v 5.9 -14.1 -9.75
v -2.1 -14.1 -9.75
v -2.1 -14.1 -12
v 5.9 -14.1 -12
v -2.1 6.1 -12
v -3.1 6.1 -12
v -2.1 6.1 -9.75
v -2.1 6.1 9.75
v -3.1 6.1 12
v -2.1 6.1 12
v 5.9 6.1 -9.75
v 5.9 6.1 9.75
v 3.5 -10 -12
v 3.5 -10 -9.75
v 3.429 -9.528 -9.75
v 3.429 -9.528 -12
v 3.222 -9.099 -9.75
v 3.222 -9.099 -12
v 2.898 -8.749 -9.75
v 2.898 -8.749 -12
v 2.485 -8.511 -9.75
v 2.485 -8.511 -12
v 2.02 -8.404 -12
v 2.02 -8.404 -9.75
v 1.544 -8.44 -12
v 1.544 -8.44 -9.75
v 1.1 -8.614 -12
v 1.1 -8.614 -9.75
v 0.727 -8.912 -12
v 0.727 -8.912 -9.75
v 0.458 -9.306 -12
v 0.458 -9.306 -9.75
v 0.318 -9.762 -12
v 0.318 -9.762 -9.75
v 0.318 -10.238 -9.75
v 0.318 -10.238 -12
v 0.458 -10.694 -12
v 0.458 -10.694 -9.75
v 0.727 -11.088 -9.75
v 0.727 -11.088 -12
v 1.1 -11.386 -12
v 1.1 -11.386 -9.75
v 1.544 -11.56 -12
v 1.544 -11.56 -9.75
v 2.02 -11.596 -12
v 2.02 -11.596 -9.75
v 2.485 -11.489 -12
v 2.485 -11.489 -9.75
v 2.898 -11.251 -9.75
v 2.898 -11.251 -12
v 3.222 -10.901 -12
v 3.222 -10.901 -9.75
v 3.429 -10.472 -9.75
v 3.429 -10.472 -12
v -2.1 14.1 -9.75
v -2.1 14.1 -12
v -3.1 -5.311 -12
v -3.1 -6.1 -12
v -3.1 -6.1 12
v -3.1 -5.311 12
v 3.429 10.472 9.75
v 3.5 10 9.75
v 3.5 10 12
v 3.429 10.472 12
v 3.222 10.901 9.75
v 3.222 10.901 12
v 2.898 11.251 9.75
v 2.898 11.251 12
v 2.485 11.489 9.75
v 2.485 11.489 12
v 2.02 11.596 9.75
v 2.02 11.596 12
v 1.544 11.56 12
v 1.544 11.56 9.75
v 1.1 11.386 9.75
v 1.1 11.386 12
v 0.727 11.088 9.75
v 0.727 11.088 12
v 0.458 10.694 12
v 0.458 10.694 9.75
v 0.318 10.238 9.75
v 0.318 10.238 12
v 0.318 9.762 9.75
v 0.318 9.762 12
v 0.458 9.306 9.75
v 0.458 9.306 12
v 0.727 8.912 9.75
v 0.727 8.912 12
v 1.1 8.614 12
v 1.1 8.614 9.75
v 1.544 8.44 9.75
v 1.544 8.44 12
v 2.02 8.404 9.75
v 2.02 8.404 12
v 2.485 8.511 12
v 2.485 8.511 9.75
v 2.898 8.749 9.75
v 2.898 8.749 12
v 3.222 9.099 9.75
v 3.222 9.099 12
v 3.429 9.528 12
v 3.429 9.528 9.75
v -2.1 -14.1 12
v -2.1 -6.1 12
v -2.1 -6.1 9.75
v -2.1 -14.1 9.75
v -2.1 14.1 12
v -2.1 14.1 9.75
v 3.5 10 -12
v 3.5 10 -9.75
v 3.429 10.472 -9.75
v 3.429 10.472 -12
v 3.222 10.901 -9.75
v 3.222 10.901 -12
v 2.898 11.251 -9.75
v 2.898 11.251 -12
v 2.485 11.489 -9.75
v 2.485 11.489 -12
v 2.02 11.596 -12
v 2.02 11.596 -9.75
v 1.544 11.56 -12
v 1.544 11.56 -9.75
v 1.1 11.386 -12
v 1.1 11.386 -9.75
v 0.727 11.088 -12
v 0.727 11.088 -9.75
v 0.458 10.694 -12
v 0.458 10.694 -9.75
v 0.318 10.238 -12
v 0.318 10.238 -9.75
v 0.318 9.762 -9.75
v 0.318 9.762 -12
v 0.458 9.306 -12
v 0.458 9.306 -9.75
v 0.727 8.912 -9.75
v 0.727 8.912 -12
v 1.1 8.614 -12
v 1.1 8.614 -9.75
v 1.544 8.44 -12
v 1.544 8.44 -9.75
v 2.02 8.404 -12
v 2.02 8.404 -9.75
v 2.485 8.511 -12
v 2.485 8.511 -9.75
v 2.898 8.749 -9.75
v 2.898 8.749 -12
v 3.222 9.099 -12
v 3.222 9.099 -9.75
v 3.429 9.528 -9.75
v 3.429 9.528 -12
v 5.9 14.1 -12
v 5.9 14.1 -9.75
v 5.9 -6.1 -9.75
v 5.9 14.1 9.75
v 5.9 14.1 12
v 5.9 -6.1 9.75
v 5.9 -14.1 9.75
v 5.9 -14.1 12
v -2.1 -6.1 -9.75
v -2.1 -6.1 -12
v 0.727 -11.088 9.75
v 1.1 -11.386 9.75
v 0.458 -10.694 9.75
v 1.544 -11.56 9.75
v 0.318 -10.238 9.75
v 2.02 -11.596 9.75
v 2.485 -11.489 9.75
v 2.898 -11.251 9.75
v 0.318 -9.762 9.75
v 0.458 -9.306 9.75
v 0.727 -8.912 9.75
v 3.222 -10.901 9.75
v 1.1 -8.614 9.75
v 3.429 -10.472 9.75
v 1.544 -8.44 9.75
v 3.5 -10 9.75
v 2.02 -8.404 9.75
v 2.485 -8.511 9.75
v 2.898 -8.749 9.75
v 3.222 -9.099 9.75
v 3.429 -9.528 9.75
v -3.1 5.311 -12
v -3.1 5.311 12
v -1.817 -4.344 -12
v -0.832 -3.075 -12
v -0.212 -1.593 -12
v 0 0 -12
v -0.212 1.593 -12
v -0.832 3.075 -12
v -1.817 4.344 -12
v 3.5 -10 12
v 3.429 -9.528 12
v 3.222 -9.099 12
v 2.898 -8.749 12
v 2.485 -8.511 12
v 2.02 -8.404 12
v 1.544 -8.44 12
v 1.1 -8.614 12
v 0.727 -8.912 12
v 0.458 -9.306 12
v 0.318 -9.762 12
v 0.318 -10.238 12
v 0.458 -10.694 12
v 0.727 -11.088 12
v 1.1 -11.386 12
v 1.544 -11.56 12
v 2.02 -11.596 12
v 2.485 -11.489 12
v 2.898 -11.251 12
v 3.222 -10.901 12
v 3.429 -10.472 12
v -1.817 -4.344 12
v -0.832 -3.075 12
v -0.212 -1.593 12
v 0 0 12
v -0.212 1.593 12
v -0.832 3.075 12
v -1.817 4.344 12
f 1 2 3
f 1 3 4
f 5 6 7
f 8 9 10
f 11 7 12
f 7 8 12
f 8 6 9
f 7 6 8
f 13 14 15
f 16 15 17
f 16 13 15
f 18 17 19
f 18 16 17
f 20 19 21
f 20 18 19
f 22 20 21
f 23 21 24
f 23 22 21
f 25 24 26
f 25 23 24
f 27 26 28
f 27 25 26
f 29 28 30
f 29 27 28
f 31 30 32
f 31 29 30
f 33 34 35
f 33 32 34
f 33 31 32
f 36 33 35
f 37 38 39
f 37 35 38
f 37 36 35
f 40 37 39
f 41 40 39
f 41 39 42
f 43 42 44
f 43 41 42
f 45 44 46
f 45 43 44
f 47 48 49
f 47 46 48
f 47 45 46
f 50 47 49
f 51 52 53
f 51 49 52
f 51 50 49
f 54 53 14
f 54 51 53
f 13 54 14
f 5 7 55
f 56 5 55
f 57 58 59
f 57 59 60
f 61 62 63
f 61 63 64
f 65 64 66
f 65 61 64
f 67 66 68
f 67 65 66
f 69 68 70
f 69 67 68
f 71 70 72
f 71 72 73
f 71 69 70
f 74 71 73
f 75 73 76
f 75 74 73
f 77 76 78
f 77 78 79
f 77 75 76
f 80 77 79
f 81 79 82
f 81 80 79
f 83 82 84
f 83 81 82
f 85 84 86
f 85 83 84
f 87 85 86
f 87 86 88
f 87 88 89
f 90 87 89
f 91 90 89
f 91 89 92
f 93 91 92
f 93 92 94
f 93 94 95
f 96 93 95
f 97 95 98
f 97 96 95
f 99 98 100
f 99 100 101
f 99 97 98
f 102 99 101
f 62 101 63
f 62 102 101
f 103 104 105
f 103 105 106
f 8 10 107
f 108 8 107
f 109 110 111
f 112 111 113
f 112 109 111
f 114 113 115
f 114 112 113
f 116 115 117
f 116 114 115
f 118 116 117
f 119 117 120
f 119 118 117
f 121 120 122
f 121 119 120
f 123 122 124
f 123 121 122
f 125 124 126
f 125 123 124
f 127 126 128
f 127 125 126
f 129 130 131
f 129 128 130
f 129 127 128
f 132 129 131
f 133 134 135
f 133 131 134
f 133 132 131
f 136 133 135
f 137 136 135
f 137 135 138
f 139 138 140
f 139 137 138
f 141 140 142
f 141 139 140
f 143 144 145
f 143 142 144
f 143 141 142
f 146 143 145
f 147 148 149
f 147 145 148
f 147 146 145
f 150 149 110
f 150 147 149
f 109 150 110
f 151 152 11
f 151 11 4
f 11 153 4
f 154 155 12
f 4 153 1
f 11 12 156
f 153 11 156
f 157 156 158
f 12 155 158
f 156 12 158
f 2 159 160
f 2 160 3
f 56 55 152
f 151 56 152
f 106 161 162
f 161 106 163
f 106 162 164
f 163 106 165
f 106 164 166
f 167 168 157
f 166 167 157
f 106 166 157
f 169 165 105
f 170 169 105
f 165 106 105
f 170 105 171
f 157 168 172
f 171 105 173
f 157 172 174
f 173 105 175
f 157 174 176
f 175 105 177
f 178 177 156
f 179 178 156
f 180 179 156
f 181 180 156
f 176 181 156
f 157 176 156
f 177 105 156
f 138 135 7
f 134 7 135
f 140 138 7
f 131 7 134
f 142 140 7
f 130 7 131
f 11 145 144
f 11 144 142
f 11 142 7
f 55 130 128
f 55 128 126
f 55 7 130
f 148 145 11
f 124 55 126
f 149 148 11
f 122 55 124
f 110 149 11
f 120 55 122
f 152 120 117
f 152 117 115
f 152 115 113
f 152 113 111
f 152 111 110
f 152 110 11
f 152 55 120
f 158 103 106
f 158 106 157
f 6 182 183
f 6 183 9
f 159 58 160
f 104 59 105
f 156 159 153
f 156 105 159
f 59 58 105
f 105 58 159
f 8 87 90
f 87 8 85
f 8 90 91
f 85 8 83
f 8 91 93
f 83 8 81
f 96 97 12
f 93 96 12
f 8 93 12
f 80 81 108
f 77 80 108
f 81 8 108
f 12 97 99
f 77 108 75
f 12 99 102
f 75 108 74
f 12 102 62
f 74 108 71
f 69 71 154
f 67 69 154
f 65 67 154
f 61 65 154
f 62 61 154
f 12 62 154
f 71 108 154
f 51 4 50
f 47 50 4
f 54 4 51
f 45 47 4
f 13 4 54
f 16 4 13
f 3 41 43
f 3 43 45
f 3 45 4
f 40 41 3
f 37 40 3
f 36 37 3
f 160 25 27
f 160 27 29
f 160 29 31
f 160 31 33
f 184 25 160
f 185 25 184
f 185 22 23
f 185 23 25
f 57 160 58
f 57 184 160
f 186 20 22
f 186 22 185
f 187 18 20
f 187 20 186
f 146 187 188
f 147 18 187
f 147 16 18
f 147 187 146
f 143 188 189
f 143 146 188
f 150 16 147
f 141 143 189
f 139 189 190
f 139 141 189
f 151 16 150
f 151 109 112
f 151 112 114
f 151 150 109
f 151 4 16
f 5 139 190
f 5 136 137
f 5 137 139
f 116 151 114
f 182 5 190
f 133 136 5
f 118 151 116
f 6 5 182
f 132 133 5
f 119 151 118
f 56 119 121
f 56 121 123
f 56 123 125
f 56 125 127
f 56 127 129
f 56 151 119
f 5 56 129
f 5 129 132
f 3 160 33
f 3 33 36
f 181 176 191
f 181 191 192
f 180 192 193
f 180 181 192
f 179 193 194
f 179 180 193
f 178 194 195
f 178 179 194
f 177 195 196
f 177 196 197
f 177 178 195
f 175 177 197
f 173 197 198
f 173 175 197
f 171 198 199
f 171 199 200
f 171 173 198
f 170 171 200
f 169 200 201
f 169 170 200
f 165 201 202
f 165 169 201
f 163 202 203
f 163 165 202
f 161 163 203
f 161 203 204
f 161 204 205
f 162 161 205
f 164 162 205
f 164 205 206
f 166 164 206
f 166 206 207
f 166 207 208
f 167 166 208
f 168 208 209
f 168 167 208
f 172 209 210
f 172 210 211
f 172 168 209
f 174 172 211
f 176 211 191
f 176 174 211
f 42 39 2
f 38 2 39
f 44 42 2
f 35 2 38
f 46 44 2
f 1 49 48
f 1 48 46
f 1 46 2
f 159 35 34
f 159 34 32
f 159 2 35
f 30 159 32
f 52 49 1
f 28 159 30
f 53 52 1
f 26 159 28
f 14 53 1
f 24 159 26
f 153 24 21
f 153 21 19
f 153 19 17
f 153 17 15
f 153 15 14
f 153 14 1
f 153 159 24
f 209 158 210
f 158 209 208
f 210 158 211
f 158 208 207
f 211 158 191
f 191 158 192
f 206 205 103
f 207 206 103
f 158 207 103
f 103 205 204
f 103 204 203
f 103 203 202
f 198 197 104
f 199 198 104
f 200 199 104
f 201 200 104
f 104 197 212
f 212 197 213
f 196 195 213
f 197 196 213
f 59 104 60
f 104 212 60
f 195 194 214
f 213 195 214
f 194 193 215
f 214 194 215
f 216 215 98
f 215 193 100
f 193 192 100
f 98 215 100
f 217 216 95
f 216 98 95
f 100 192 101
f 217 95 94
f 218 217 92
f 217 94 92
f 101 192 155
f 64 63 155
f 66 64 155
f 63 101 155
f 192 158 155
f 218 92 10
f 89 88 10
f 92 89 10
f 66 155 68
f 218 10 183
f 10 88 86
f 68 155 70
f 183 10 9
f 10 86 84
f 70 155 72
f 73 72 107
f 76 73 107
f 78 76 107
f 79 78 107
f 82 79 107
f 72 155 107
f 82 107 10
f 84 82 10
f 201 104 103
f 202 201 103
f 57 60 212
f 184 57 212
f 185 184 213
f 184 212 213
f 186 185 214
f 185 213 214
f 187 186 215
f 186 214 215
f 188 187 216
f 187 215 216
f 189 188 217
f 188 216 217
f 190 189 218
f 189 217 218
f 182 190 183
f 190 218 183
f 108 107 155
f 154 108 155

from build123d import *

# Parameters (mm, degrees)
SKETCH_R          = 1.6
PAD_DEPTH         = 12
SKETCH001_W       = 8
SKETCH001_H       = 32
POCKET_DEPTH      = 12.001
POCKET_DEPTH_BACK = 12.001
SKETCH002_W       = 24
SKETCH002_H       = 16
POCKET001_DEPTH   = 9.75


with BuildPart() as part:
    # Sketch → Pad (new body, symmetric)
    with BuildSketch(Plane.XY):
        with BuildLine():
            ThreePointArc((-6.1, -6.1), (0, 0), (-6.1, 6.1))
            Line((-6.1, 6.1), (-2.1, 6.1))
            Line((-2.1, 6.1), (-2.1, 14.1))
            Line((-2.1, 14.1), (5.9, 14.1))
            Line((5.9, 14.1), (5.9, -14.1))
            Line((-2.1, -14.1), (5.9, -14.1))
            Line((-2.1, -6.1), (-2.1, -14.1))
            Line((-6.1, -6.1), (-2.1, -6.1))
        make_face()
        with Locations((1.9, 10)):
            Circle(SKETCH_R, mode=Mode.SUBTRACT)
        with Locations((1.9, -10)):
            Circle(SKETCH_R, mode=Mode.SUBTRACT)
    extrude(amount=PAD_DEPTH, both=True)

    # Sketch001 → Pocket (cut, two sides)
    with BuildSketch(Plane.XY) as pocket_sk:
        with Locations((-7.1, 0)):
            Rectangle(SKETCH001_W, SKETCH001_H)
    extrude(amount=-POCKET_DEPTH, mode=Mode.SUBTRACT)
    extrude(pocket_sk.sketch, amount=POCKET_DEPTH_BACK, mode=Mode.SUBTRACT)

    # Sketch002 → Pocket001 (cut, symmetric)
    with BuildSketch(Plane.XY):
        with Locations((5.9, 14.1)):
            Rectangle(SKETCH002_W, SKETCH002_H)
        with Locations((5.9, -14.1)):
            Rectangle(SKETCH002_W, SKETCH002_H)
    extrude(amount=POCKET001_DEPTH, both=True, mode=Mode.SUBTRACT)


solid = part.part
